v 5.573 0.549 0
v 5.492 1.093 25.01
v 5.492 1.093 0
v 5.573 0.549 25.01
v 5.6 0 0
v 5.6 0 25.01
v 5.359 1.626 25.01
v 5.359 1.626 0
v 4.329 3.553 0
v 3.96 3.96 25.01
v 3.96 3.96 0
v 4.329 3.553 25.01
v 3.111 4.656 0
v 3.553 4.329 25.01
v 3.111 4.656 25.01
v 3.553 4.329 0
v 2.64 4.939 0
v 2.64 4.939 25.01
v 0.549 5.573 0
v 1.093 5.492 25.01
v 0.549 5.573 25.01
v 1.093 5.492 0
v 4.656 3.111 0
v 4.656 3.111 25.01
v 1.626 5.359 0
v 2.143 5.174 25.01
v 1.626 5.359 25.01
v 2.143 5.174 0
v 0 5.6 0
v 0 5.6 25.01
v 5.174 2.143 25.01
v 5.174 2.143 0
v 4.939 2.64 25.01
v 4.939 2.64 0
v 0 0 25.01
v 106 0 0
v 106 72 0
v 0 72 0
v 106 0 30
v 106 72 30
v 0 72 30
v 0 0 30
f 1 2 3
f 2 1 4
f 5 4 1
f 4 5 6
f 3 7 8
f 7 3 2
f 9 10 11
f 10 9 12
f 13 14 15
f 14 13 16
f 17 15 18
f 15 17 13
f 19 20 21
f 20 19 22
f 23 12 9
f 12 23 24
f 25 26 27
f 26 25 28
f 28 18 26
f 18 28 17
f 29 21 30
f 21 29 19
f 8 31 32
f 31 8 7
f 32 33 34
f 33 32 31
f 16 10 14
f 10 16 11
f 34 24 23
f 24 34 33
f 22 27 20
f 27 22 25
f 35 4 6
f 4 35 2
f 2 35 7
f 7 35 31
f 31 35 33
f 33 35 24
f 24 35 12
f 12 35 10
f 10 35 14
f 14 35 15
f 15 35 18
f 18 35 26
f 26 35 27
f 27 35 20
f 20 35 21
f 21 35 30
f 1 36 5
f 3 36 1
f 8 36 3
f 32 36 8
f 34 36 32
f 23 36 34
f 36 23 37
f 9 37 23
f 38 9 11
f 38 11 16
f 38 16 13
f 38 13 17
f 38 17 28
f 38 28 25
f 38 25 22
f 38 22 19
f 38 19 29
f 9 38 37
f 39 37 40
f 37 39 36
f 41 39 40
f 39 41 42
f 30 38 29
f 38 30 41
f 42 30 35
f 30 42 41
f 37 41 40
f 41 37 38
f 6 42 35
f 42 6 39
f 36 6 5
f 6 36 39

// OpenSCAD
// --- Dimensions ---
BLOCK_L = 106;          // Block length (X)
BLOCK_W = 72;           // Block width (Y)
BLOCK_H = 30;           // Block height (Z)
TUBE_OD = 11.2;         // Tube outer diameter (hole diameter)
TUBE_DEPTH = 25;      // Hole depth (open at top)
FLOOR_THICK = 5;        // Solid floor remaining at bottom
GRID_NX = 6;            // Holes along X per row
GRID_NY = 4;            // Number of rows along Y
SPACING_X = 16;         // Centre-to-centre spacing along X
SPACING_Y = 16;        // Centre-to-centre spacing along Y

// Derived
TOTAL_HOLE_DEPTH = BLOCK_H - FLOOR_THICK;  // Should equal TUBE_DEPTH

// --- Hole grid origin (bottom-left of grid) ---
GRID_X0 = (BLOCK_L - (GRID_NX - 1) * SPACING_X) / 2;
GRID_Y0 = (BLOCK_W - (GRID_NY - 1) * SPACING_Y) / 2;

// --- Build ---
$fn = 64;

difference() {
    // Solid block
    cube([BLOCK_L, BLOCK_W, BLOCK_H], center = false);

    // Cut holes
    for (ix = [0 : GRID_NX - 1]) {
        for (iy = [0 : GRID_NY - 1]) {
            hx = GRID_X0 + ix * SPACING_X;
            hy = GRID_Y0 + iy * SPACING_Y;

            // Hole extends slightly past the bottom so no coplanar face
            cylinder(d = TUBE_OD, h = TOTAL_HOLE_DEPTH + 0.01,
                   center = false,
                   at = [hx, hy, 0]);
        }
    }
}
